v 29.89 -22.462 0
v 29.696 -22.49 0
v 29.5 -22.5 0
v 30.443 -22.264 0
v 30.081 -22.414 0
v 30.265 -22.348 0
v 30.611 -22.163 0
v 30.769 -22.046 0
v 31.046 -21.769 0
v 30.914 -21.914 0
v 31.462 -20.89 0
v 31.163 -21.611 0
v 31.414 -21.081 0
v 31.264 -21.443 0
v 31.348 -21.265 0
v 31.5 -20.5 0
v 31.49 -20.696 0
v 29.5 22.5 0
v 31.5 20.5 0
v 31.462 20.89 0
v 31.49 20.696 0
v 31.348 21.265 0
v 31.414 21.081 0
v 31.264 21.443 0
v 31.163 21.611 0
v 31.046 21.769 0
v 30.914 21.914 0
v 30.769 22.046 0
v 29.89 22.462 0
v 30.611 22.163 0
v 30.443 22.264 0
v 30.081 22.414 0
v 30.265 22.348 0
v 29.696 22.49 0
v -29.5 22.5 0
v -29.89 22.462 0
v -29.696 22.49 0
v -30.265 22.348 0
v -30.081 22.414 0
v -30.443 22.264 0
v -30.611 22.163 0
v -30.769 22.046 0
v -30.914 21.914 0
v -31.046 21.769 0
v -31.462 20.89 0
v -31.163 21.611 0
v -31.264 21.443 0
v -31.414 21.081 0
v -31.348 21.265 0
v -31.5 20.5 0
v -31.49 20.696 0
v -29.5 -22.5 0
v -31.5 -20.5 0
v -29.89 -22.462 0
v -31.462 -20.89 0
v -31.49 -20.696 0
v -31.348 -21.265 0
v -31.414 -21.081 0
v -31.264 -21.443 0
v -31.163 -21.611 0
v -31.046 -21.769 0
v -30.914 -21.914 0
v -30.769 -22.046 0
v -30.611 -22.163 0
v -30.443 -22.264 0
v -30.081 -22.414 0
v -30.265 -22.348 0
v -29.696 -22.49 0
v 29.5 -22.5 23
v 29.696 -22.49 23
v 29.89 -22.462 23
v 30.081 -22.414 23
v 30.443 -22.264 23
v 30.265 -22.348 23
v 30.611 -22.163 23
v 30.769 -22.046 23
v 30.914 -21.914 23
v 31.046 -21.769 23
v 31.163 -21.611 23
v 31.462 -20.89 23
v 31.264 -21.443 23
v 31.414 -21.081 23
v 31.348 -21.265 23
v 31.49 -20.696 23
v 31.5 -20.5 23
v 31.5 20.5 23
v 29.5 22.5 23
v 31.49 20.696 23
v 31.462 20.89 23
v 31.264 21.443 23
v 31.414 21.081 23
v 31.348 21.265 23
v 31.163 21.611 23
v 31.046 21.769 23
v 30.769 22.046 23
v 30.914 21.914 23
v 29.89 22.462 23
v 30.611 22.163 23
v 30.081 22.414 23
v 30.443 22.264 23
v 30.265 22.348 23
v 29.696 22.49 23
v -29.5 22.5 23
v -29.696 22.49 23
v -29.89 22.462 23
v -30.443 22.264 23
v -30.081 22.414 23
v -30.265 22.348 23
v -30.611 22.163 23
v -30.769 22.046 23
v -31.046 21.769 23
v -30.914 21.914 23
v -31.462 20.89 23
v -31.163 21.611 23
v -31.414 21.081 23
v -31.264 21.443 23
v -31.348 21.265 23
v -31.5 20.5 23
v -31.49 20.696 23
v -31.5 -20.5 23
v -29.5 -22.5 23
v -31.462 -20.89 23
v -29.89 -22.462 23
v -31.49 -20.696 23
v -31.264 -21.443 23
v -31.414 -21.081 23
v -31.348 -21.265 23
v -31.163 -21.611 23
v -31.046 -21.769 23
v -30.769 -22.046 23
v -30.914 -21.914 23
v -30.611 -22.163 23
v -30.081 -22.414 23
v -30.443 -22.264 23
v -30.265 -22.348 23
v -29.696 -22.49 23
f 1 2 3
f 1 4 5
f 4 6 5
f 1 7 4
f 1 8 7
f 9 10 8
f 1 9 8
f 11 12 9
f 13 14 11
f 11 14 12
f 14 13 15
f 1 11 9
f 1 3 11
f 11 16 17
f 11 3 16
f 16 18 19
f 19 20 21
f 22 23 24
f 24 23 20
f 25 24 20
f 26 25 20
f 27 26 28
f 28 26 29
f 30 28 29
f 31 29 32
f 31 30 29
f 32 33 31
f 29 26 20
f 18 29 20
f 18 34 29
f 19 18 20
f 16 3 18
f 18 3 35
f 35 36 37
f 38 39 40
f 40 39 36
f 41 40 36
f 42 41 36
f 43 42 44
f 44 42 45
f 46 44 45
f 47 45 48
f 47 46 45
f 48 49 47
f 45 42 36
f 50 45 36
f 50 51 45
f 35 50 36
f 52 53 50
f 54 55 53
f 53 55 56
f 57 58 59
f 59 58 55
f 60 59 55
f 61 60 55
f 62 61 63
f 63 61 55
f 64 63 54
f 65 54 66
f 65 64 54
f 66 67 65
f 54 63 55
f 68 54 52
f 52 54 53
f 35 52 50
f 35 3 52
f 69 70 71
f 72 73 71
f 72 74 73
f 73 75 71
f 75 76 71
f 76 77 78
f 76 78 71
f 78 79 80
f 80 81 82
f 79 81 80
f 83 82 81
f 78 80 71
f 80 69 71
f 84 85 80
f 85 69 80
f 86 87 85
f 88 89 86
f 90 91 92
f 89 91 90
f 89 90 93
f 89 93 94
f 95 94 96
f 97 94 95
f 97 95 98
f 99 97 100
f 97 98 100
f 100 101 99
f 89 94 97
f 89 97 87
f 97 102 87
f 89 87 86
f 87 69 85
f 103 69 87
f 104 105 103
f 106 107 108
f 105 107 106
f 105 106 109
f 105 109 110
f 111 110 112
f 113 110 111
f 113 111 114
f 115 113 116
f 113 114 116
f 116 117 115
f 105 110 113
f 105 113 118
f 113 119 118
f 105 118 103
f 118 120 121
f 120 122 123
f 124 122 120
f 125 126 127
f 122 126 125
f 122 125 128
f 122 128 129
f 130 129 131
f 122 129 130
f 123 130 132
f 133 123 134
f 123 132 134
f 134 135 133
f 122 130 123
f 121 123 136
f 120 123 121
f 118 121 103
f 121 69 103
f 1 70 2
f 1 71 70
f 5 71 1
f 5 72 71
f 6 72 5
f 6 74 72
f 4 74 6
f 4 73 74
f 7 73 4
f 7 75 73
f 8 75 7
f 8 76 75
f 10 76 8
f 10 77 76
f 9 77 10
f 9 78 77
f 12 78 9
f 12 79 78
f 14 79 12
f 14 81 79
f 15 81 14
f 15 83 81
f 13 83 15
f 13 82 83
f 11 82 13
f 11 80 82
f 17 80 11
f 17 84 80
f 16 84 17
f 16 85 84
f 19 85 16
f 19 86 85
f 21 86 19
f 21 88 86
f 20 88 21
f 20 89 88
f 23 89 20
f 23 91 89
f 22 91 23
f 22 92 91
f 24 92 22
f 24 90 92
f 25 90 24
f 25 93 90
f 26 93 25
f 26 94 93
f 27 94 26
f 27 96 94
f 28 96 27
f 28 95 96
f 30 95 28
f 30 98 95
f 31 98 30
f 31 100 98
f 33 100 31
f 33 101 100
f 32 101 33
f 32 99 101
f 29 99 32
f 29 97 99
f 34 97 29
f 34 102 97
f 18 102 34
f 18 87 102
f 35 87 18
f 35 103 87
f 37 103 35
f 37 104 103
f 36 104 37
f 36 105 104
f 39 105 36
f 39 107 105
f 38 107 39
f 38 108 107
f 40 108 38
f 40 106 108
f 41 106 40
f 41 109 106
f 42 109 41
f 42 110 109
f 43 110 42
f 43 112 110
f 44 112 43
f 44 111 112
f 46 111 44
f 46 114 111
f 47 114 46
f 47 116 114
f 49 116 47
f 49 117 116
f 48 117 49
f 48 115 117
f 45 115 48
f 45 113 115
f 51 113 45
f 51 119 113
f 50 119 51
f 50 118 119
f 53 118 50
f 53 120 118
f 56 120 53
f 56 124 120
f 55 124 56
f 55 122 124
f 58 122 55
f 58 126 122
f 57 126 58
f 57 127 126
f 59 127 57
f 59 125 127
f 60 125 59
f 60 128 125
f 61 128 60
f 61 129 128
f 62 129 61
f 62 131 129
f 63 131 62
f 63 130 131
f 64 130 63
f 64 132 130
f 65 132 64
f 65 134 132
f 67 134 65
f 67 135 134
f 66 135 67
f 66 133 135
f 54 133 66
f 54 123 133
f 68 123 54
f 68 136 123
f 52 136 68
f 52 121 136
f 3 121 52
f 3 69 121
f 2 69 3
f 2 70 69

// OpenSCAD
$fn = 64;

module ssr_module(len=63.0, wid=45.0, ht=23.0, corner_r=2.0) {
    // Main body: rounded rectangular prism
    linear_extrude(height=ht)
        offset(r=corner_r)
            square([len - 2*corner_r, wid - 2*corner_r], center=true);
}

ssr_module();
